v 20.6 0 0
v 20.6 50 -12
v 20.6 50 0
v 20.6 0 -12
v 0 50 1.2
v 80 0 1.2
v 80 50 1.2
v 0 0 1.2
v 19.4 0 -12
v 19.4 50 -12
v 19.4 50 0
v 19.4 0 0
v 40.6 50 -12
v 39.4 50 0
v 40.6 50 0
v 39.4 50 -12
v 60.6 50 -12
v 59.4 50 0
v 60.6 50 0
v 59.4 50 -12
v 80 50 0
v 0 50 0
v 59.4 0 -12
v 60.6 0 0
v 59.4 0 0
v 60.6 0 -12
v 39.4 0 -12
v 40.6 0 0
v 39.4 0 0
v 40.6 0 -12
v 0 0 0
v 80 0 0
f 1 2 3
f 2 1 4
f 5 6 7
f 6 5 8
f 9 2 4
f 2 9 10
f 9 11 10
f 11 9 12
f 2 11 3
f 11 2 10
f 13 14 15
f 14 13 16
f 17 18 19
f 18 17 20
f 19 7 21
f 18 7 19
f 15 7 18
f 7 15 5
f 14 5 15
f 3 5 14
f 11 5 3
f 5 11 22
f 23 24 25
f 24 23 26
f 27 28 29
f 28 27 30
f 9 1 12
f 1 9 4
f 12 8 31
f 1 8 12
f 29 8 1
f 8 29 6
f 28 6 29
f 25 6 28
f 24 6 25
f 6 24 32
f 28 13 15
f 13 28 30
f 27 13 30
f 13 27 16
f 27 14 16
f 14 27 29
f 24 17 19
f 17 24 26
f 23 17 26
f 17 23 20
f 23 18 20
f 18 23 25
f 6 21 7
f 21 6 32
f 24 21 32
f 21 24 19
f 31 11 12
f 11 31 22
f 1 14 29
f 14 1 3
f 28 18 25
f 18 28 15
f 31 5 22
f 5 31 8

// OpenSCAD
$fn = 32;

// ----------------------------------------------------------------------
// Ribbed panel: 1.2 mm panel
// ----------------------------------------------------------------------

// --- parameters (mm) ---
panel_l = 80;             // panel length, X
panel_w = 50;             // panel width, Y
panel_t = 1.2;            // panel thickness, Z
rib_t = 1.2;              // rib thickness
rib_h = 12;               // rib height below the panel
ribs = 3;                 // number of ribs

total_h = panel_t + rib_h;  // overall height

union() {
  cube([panel_l, panel_w, panel_t]);
  for (i = [1 : ribs])
    translate([i * panel_l / (ribs + 1) - rib_t / 2, 0, -rib_h])
      cube([rib_t, panel_w, rib_h + panel_t]);
}
